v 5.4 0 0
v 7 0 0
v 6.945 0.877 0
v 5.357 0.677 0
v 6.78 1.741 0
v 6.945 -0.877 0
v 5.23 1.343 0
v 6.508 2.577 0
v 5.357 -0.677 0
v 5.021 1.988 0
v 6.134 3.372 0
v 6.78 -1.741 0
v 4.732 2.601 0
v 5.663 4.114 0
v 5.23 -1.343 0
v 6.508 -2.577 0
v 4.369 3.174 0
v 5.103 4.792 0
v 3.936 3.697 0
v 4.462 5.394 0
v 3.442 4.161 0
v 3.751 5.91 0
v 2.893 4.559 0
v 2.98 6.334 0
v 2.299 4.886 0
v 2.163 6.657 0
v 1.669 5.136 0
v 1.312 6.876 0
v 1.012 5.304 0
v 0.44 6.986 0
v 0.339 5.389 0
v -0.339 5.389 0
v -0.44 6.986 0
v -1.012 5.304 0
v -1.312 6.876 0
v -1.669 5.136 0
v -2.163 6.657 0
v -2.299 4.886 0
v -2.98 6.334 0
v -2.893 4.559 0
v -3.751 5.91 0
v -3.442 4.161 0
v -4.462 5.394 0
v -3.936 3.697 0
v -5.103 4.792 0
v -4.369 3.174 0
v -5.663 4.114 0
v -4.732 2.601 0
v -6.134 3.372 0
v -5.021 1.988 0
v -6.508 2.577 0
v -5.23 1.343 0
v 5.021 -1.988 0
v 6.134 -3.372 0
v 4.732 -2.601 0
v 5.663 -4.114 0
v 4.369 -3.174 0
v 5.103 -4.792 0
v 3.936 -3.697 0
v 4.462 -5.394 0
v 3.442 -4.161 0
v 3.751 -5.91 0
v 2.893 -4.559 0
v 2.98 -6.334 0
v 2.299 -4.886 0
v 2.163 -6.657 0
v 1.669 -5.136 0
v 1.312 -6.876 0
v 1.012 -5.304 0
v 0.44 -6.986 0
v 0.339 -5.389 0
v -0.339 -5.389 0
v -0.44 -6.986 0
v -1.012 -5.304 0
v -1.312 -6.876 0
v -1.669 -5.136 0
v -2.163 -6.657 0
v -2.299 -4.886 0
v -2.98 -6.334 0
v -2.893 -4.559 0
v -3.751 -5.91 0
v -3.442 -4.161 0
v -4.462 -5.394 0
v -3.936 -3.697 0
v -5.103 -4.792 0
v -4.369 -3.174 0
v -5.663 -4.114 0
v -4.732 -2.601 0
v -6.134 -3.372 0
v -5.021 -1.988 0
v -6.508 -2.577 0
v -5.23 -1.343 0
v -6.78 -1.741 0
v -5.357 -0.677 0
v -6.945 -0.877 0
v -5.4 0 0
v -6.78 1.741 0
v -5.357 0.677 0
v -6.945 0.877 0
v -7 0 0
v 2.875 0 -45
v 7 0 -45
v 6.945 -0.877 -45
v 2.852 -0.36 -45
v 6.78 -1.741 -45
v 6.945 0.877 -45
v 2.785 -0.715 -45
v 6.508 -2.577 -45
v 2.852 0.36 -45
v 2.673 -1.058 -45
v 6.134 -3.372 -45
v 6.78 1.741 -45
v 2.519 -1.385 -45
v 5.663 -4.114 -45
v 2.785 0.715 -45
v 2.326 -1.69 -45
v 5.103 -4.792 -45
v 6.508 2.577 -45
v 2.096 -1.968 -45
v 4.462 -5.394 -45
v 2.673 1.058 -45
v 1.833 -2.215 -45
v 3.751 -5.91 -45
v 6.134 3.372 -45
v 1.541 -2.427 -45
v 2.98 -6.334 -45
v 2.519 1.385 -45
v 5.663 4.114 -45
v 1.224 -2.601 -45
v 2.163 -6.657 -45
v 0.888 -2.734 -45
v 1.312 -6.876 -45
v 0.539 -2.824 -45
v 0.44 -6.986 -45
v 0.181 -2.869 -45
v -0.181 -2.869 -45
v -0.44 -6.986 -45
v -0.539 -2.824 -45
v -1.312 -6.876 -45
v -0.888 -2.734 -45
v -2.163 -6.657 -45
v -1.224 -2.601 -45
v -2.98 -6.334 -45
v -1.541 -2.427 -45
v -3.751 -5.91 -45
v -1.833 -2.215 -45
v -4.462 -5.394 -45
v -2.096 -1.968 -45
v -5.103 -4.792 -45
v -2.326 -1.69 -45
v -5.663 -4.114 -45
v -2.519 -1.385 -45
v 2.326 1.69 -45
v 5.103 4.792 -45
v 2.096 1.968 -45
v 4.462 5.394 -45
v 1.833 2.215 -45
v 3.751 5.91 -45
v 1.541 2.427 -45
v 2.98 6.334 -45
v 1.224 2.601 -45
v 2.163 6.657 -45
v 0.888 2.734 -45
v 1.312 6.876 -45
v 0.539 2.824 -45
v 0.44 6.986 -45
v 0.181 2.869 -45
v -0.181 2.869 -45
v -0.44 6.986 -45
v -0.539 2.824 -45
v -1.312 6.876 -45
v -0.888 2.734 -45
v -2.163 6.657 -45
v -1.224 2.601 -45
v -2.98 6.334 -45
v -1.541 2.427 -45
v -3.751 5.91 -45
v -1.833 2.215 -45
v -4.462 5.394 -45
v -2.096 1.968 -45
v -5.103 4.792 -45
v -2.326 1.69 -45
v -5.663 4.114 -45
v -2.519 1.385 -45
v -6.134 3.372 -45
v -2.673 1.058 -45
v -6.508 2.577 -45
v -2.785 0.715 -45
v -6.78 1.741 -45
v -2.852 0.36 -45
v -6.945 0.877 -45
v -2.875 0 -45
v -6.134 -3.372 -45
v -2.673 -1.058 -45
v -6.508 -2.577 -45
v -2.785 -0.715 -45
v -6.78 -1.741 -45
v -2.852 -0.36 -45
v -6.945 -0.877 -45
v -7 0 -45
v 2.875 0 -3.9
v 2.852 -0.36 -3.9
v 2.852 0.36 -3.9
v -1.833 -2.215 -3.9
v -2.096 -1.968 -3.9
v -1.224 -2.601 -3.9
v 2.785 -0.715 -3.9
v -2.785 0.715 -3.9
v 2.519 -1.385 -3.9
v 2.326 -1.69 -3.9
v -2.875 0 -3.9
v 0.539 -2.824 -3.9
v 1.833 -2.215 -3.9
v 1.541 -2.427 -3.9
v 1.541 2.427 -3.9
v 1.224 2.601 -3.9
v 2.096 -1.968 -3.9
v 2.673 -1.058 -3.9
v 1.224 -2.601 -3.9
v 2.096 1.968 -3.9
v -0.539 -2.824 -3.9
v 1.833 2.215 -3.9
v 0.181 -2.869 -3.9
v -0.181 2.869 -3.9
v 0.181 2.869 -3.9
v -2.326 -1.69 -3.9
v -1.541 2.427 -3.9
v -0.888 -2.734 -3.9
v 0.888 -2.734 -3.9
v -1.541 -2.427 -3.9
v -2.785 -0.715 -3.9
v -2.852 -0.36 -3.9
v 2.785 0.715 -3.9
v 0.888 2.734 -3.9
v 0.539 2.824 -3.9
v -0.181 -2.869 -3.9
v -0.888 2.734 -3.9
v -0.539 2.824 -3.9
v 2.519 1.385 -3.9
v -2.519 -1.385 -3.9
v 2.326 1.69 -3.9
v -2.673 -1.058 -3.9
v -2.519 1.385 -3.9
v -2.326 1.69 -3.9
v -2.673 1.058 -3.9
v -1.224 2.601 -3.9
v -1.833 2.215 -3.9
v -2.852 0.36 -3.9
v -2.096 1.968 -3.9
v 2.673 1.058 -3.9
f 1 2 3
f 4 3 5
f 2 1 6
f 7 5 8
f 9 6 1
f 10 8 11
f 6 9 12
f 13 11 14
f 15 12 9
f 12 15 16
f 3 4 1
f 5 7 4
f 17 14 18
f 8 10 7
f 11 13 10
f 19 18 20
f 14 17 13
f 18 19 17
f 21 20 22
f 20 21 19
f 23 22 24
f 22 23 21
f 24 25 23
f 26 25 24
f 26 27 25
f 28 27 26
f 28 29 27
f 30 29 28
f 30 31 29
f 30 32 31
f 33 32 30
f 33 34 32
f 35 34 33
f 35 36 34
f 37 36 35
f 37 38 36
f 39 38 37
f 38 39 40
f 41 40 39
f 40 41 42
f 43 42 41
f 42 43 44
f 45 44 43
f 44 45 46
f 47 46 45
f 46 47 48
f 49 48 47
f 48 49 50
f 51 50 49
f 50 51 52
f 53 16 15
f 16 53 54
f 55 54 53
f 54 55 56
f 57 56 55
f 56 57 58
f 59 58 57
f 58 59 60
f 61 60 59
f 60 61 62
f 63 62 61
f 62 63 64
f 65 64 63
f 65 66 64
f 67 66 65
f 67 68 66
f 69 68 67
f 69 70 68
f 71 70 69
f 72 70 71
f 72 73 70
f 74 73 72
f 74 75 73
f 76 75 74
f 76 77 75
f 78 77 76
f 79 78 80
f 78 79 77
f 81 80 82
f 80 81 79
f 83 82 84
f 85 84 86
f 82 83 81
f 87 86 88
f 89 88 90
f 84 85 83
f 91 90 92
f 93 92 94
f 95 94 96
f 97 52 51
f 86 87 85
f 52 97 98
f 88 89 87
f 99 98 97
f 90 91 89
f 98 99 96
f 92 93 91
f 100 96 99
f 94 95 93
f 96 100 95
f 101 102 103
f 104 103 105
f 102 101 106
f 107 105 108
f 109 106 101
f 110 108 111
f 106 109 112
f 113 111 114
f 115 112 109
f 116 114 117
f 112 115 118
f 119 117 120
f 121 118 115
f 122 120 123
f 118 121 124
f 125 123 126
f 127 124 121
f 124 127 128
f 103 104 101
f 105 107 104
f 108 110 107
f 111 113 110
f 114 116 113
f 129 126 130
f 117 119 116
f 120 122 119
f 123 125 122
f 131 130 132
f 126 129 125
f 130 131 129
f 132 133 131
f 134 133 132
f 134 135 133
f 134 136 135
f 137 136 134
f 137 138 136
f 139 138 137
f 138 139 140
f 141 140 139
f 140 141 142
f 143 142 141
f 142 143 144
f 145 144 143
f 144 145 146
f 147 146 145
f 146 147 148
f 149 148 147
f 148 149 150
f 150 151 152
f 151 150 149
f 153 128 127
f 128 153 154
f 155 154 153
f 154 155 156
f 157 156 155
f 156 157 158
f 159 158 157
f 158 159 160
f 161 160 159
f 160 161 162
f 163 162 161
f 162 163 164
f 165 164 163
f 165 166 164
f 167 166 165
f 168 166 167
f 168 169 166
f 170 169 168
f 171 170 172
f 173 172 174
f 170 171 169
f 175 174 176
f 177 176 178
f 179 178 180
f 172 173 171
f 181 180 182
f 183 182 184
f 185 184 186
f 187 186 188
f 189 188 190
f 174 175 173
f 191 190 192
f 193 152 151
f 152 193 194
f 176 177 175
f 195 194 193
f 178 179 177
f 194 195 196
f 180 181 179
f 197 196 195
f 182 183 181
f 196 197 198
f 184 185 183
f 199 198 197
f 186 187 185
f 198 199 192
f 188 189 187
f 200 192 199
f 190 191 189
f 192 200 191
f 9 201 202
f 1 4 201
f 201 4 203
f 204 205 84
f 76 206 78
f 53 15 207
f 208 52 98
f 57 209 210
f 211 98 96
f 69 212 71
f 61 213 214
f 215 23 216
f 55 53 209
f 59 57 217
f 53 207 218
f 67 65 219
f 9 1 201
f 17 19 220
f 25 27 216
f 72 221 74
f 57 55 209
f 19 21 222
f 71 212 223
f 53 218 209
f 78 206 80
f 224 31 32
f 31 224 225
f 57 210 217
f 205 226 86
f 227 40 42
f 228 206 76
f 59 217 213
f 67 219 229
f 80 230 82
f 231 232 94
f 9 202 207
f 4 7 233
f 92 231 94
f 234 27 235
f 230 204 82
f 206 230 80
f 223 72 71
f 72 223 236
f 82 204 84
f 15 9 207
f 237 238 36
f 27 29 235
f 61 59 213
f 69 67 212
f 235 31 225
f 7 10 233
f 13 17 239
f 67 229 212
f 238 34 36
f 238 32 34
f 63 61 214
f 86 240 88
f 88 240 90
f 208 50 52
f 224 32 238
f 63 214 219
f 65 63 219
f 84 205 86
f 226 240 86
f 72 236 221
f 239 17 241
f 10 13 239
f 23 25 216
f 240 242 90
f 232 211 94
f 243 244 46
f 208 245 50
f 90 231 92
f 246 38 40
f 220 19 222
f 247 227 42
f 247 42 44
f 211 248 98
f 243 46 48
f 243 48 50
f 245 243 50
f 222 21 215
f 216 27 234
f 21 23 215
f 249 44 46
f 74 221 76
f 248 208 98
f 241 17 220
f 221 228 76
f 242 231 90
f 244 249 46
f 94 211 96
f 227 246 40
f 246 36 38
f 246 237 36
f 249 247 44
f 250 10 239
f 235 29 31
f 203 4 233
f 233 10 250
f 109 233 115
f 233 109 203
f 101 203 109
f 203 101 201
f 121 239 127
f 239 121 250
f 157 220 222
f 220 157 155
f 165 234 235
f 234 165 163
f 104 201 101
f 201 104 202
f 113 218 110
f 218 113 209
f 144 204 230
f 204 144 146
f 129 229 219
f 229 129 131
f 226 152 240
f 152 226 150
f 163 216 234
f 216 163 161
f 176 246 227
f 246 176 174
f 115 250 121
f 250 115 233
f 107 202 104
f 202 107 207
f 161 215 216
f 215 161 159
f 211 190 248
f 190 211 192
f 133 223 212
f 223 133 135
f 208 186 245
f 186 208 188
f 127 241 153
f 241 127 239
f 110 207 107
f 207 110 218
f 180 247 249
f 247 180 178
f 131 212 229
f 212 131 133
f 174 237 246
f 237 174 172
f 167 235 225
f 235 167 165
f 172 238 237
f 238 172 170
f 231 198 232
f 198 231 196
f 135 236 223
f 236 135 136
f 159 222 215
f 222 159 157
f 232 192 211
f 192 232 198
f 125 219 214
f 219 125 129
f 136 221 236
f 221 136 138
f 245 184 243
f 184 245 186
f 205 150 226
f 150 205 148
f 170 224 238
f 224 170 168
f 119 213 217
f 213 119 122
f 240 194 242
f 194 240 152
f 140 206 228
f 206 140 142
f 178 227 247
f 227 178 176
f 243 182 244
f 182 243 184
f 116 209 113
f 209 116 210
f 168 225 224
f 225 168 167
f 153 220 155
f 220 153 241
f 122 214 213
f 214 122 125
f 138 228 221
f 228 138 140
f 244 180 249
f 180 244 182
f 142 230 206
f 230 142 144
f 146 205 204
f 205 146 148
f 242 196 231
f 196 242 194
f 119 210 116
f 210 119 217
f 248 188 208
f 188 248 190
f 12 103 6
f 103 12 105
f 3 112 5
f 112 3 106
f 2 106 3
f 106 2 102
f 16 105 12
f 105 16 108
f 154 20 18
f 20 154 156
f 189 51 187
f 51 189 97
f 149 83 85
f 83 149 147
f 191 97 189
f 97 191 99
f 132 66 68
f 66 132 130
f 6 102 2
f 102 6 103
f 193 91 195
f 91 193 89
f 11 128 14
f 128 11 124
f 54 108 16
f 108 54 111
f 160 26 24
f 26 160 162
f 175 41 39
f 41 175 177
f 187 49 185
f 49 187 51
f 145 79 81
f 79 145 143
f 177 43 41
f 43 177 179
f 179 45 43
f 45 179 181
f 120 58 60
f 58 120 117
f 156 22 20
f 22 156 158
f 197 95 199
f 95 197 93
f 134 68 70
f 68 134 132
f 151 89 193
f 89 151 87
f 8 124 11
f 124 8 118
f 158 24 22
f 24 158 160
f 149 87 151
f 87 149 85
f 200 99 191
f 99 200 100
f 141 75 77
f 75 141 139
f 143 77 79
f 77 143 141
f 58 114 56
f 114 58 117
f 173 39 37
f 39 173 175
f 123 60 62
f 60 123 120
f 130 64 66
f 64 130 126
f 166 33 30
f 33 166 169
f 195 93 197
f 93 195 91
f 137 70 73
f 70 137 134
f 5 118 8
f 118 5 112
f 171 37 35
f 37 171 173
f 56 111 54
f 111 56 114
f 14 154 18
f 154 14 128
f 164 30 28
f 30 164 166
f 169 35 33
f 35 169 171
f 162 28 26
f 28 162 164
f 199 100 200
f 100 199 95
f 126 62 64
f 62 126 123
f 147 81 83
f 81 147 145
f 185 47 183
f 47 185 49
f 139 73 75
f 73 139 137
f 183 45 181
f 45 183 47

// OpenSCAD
$fn = 50;


difference() {
	union() {
		translate(v = [0, 0, -45.0000000000]) {
			cylinder(h = 45, r = 7.0000000000);
		}
		cylinder(h = 0, r = 16.0000000000);
	}
	union() {
		translate(v = [0, 0, 0]) {
			rotate(a = [0, 0, 0]) {
				difference() {
					union() {
						#translate(v = [0, 0, -45.0000000000]) {
							cylinder(h = 45, r = 2.6000000000);
						}
						#translate(v = [0, 0, -3.9000000000]) {
							cylinder(h = 3.9000000000, r = 7.0000000000, r1 = 2.8750000000, r2 = 5.4000000000);
						}
						#translate(v = [0, 0, -45.0000000000]) {
							cylinder(h = 45, r = 2.8750000000);
						}
						#translate(v = [0, 0, -45.0000000000]) {
							cylinder(h = 45, r = 2.6000000000);
						}
					}
					union();
				}
			}
		}
	}
}
